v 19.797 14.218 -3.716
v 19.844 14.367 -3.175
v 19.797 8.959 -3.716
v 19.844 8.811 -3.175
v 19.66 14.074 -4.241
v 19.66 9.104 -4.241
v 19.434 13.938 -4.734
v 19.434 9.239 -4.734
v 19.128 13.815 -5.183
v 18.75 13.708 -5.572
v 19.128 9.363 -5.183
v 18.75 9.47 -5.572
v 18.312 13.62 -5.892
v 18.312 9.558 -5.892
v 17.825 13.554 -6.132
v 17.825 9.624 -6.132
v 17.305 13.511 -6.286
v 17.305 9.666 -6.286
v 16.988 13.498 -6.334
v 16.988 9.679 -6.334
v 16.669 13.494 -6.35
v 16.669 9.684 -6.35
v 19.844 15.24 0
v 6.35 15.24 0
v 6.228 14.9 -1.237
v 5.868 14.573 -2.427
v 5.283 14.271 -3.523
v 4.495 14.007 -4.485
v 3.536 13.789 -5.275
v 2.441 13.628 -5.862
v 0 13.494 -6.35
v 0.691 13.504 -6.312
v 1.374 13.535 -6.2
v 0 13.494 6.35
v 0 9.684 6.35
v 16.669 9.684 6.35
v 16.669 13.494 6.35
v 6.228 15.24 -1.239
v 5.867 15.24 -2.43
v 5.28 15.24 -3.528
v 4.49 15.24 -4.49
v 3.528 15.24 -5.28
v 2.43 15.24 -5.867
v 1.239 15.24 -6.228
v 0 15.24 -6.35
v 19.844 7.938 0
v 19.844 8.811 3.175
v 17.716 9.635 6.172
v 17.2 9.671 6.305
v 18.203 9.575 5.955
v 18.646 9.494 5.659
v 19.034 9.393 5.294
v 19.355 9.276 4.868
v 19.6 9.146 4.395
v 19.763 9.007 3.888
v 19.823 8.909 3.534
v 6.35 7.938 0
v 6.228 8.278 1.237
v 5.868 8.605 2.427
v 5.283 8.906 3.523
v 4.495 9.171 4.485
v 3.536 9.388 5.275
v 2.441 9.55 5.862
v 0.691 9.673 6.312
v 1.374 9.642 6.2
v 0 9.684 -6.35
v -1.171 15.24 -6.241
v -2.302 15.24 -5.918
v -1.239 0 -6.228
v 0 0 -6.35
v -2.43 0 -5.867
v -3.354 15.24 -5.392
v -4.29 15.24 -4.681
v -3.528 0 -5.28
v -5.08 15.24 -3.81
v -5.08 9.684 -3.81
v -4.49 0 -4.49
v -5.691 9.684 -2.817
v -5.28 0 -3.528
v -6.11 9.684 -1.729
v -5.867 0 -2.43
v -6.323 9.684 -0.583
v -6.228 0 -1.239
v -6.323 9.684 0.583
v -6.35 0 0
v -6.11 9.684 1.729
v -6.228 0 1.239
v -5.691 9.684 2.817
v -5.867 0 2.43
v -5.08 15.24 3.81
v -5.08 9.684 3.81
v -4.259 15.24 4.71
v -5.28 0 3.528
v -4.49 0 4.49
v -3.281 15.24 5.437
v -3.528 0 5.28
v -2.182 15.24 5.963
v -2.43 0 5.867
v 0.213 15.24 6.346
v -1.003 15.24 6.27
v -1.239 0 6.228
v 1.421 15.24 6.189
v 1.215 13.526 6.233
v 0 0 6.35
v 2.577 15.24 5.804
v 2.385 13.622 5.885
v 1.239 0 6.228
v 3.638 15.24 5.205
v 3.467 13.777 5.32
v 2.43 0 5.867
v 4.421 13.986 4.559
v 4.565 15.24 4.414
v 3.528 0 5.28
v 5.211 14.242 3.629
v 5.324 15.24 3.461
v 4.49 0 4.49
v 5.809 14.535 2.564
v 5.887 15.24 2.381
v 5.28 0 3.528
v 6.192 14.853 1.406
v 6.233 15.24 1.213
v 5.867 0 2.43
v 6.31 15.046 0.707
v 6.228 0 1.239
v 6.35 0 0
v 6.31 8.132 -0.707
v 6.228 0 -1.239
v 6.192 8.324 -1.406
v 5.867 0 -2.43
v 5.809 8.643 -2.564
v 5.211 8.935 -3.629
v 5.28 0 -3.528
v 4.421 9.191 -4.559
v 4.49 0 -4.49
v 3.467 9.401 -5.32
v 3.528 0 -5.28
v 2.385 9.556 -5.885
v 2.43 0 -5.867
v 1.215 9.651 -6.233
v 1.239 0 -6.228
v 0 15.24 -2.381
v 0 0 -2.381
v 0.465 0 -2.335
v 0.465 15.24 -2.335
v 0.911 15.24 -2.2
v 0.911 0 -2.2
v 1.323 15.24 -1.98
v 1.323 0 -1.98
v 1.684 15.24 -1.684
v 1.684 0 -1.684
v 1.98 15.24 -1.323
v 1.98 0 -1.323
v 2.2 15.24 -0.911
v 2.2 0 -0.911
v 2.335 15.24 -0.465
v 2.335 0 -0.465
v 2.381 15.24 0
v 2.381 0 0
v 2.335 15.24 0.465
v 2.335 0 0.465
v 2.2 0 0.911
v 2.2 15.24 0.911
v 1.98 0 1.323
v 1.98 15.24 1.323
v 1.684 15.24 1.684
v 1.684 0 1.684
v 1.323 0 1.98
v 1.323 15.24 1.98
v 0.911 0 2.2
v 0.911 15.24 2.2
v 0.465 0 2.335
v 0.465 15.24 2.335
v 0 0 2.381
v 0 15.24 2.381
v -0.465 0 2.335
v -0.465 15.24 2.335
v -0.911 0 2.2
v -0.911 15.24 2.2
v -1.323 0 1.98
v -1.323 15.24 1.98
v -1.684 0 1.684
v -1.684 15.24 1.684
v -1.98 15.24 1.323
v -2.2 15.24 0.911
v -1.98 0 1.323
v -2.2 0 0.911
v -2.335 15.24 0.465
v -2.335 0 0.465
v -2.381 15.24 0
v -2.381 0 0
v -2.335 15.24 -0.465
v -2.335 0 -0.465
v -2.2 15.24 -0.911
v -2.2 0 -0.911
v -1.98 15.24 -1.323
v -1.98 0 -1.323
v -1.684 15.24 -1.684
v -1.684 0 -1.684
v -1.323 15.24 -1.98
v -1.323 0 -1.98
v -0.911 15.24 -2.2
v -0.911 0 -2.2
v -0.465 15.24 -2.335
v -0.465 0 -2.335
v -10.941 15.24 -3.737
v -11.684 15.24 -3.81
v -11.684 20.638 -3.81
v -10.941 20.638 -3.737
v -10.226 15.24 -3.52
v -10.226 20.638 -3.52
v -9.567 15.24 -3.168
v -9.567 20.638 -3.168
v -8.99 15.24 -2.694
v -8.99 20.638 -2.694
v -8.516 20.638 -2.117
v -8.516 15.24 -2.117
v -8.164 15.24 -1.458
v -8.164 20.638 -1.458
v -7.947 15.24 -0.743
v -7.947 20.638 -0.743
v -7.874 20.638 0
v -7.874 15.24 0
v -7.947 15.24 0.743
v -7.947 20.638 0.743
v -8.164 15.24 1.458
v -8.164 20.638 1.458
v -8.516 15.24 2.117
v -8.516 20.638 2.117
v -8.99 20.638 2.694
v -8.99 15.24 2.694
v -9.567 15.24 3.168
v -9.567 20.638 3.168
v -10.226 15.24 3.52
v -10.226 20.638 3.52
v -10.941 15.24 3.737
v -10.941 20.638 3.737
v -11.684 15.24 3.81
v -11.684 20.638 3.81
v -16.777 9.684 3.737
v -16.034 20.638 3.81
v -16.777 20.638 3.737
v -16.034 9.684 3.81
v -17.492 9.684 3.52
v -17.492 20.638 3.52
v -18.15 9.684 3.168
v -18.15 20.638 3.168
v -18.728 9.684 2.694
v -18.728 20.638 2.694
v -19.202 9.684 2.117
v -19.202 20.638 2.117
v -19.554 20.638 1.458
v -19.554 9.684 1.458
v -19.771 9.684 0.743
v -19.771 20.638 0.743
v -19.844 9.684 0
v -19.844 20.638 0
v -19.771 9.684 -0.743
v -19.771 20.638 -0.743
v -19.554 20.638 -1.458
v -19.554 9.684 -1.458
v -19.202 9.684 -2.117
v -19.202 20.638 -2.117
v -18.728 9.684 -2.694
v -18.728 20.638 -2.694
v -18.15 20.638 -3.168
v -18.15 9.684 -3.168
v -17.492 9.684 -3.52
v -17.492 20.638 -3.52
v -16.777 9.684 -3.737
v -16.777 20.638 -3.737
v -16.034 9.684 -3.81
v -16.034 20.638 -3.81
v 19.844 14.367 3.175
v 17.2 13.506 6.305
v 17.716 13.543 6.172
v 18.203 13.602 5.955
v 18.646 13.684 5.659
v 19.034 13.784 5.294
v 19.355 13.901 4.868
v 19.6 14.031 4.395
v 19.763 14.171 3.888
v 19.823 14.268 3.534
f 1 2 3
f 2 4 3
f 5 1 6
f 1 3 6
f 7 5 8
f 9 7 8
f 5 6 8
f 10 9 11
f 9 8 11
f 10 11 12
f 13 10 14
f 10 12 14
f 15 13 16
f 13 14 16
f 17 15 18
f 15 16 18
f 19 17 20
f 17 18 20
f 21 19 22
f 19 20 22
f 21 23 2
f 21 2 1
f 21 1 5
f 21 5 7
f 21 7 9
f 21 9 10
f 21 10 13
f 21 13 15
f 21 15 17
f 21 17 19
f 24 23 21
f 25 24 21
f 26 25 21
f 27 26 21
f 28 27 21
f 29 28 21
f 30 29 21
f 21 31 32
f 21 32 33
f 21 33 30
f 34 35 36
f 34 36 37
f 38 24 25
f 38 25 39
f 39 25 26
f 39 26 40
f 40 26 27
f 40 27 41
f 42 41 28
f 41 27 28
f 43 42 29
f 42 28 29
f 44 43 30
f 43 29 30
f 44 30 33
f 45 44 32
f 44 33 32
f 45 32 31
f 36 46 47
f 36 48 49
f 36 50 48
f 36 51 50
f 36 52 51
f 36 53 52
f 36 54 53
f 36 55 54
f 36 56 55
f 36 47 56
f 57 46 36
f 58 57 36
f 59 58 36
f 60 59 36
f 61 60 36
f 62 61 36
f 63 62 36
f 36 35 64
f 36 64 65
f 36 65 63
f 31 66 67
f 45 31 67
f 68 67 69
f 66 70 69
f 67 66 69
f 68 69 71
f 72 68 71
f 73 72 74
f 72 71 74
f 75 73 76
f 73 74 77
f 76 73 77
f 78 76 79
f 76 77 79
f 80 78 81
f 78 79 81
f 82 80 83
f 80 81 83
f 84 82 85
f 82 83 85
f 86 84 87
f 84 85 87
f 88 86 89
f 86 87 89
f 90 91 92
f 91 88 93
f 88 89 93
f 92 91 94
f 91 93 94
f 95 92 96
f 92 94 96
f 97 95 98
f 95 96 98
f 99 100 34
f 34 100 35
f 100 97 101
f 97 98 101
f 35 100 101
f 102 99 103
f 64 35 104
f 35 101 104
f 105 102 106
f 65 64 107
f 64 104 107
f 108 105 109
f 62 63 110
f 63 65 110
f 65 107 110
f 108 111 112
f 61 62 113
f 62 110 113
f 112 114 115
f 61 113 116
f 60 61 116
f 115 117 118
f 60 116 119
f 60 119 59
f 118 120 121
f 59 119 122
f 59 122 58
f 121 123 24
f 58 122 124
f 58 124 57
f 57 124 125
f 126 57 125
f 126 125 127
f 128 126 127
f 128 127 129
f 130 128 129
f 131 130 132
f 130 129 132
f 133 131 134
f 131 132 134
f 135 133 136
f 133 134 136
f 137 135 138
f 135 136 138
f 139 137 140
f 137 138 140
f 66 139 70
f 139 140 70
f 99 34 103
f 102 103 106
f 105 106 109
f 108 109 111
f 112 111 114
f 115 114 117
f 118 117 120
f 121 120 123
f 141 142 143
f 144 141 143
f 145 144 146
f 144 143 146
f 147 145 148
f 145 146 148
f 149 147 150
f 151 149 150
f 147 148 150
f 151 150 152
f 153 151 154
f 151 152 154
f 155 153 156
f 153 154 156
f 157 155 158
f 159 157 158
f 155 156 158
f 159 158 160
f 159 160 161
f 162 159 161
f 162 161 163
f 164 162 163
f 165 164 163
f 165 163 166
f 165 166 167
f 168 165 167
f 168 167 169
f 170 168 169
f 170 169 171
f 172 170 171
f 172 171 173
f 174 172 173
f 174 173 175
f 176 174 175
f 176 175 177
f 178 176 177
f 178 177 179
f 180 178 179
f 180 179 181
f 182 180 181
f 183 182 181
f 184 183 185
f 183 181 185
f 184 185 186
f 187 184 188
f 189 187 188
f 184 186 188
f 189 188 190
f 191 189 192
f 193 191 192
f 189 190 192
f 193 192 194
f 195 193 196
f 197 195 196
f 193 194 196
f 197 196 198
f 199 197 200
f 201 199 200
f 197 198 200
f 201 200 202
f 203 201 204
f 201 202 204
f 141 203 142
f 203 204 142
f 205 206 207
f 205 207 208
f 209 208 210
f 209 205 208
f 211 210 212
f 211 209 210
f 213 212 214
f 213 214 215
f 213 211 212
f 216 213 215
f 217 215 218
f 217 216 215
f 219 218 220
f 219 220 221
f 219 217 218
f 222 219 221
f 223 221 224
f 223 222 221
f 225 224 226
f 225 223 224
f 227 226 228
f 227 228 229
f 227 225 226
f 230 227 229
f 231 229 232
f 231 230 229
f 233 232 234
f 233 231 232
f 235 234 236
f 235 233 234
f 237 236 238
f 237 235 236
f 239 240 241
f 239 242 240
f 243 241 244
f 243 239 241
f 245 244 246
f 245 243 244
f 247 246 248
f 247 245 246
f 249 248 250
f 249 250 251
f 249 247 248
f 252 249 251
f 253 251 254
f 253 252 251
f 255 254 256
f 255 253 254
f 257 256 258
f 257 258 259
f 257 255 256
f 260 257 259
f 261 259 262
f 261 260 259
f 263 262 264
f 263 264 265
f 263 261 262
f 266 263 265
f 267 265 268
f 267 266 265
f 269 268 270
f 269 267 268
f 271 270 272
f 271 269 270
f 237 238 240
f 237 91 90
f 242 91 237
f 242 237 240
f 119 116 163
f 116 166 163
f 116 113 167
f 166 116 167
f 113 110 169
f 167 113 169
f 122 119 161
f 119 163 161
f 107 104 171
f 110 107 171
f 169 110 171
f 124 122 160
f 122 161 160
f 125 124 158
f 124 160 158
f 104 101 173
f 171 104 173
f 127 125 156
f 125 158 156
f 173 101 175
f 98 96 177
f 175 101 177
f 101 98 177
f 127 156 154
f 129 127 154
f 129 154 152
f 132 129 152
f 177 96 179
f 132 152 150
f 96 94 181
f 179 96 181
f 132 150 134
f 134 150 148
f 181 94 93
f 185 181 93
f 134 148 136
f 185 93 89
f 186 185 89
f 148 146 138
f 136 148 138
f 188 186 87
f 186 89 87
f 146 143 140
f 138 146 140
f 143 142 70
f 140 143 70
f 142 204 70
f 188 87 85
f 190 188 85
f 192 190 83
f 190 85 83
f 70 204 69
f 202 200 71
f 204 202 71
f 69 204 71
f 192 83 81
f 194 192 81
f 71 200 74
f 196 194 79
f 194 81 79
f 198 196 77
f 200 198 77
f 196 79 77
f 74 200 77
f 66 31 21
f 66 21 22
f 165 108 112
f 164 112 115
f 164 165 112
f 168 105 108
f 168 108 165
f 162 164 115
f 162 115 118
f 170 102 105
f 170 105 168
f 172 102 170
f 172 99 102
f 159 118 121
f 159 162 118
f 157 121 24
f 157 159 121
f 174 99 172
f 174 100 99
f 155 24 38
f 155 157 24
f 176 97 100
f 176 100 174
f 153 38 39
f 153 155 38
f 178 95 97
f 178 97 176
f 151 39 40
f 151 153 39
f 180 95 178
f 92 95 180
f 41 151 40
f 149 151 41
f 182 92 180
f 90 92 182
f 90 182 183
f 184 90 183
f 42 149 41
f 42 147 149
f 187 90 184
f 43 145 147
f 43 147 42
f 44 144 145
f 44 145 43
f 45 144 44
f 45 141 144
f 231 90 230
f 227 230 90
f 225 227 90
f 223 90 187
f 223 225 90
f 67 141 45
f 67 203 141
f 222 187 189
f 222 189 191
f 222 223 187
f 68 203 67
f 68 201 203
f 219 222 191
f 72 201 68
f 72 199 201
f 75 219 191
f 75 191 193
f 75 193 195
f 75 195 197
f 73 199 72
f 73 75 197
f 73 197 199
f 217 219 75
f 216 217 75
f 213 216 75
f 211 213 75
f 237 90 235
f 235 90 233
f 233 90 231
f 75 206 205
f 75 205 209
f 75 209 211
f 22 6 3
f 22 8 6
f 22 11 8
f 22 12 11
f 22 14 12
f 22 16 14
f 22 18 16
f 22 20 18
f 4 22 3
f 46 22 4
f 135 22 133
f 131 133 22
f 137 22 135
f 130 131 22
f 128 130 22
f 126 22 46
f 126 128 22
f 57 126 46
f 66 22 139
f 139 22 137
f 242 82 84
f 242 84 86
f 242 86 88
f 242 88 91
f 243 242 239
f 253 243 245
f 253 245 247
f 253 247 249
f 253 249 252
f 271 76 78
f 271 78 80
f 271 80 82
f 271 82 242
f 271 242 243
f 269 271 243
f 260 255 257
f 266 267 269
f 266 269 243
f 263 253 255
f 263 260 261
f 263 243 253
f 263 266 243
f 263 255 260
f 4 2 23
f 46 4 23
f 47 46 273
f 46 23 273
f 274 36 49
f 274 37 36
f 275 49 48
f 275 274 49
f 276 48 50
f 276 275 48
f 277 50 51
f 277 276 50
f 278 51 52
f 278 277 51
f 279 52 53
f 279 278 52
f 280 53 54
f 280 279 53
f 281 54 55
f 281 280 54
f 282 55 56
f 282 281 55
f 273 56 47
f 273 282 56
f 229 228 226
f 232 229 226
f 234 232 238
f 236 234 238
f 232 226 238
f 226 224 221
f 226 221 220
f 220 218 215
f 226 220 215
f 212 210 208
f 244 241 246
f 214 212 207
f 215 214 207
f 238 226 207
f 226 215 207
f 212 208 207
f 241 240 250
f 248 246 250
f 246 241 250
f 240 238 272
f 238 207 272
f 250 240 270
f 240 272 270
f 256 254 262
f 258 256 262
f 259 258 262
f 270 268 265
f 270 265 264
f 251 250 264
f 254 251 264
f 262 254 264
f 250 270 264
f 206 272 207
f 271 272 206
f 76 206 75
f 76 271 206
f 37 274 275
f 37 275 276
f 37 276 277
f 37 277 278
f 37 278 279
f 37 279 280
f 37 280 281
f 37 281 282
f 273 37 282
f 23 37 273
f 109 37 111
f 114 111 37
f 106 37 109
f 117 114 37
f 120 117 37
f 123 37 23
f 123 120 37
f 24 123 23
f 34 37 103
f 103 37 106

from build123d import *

# Parameters (mm, degrees)
SKETCH1_R           = 6.35
BOSS_EXTRUDE1_DEPTH = 15.24
BOSS_EXTRUDE2_DEPTH = 19.84375
FILLET1_R           = 3.175
SKETCH3_R           = 2.38125
CUT_EXTRUDE1_DEPTH  = 26.813843458
BOSS_EXTRUDE3_DEPTH = 5.55625
BOSS_EXTRUDE4_DEPTH = 5.3975


with BuildPart() as part:
    # Sketch1 → Boss-Extrude1 (new body)
    with BuildSketch(Plane(origin=(0, 0, 0), x_dir=(1, 0, 0), z_dir=(0, 1, 0))):
        with Locations(Location((0, 0, 0), (0, 0, 90))):
            Circle(SKETCH1_R)
    extrude(amount=BOSS_EXTRUDE1_DEPTH)

    # Sketch2 → Boss-Extrude2 (add)
    with BuildSketch(Plane(origin=(0, 0, 0), x_dir=(0, 0, -1), z_dir=(1, 0, 0))):
        Polygon((-6.35, 9.68375), (-6.35, 13.49375), (0, 15.24), (6.35, 13.49375), (6.35, 9.68375), (0, 7.9375), align=None)
    extrude(amount=BOSS_EXTRUDE2_DEPTH)

    # Fillet1
    fillet1_edges = [part.edges().sort_by_distance(p)[0] for p in [
        (19.84375, 11.58875, 6.35),
        (19.84375, 11.58875, -6.35),
    ]]
    fillet(fillet1_edges, radius=FILLET1_R)

    # Sketch3 → Cut-Extrude1 (cut, through all)
    with BuildSketch(Plane.XZ):
        with Locations(Location((0, 0, 0), (0, 0, 270))):
            Circle(SKETCH3_R)
    extrude(amount=-CUT_EXTRUDE1_DEPTH, mode=Mode.SUBTRACT)

    # Sketch4 → Boss-Extrude3 (add)
    with BuildSketch(Plane(origin=(0, 15.24, 0), x_dir=(1, 0, 0), z_dir=(0, 1, 0))):
        with BuildLine():
            Line((-5.08, -3.81), (-16.03375, -3.81))
            ThreePointArc((-16.03375, -3.81), (-19.84375, 0), (-16.03375, 3.81))
            Line((-16.03375, 3.81), (-5.08, 3.81))
            ThreePointArc((-5.08, 3.81), (-6.35, 0), (-5.08, -3.81))
        make_face()
    extrude(amount=-BOSS_EXTRUDE3_DEPTH)

    # Sketch5 → Boss-Extrude4 (add)
    with BuildSketch(Plane(origin=(0, 15.24, 0), x_dir=(1, 0, 0), z_dir=(0, 1, 0))):
        with BuildLine():
            Line((-16.03375, 3.81), (-11.684, 3.81))
            ThreePointArc((-11.684, 3.81), (-7.874, 0), (-11.684, -3.81))
            Line((-11.684, -3.81), (-16.03375, -3.81))
            ThreePointArc((-16.03375, -3.81), (-19.84375, 0), (-16.03375, 3.81))
        make_face()
    extrude(amount=BOSS_EXTRUDE4_DEPTH)


solid = part.part
